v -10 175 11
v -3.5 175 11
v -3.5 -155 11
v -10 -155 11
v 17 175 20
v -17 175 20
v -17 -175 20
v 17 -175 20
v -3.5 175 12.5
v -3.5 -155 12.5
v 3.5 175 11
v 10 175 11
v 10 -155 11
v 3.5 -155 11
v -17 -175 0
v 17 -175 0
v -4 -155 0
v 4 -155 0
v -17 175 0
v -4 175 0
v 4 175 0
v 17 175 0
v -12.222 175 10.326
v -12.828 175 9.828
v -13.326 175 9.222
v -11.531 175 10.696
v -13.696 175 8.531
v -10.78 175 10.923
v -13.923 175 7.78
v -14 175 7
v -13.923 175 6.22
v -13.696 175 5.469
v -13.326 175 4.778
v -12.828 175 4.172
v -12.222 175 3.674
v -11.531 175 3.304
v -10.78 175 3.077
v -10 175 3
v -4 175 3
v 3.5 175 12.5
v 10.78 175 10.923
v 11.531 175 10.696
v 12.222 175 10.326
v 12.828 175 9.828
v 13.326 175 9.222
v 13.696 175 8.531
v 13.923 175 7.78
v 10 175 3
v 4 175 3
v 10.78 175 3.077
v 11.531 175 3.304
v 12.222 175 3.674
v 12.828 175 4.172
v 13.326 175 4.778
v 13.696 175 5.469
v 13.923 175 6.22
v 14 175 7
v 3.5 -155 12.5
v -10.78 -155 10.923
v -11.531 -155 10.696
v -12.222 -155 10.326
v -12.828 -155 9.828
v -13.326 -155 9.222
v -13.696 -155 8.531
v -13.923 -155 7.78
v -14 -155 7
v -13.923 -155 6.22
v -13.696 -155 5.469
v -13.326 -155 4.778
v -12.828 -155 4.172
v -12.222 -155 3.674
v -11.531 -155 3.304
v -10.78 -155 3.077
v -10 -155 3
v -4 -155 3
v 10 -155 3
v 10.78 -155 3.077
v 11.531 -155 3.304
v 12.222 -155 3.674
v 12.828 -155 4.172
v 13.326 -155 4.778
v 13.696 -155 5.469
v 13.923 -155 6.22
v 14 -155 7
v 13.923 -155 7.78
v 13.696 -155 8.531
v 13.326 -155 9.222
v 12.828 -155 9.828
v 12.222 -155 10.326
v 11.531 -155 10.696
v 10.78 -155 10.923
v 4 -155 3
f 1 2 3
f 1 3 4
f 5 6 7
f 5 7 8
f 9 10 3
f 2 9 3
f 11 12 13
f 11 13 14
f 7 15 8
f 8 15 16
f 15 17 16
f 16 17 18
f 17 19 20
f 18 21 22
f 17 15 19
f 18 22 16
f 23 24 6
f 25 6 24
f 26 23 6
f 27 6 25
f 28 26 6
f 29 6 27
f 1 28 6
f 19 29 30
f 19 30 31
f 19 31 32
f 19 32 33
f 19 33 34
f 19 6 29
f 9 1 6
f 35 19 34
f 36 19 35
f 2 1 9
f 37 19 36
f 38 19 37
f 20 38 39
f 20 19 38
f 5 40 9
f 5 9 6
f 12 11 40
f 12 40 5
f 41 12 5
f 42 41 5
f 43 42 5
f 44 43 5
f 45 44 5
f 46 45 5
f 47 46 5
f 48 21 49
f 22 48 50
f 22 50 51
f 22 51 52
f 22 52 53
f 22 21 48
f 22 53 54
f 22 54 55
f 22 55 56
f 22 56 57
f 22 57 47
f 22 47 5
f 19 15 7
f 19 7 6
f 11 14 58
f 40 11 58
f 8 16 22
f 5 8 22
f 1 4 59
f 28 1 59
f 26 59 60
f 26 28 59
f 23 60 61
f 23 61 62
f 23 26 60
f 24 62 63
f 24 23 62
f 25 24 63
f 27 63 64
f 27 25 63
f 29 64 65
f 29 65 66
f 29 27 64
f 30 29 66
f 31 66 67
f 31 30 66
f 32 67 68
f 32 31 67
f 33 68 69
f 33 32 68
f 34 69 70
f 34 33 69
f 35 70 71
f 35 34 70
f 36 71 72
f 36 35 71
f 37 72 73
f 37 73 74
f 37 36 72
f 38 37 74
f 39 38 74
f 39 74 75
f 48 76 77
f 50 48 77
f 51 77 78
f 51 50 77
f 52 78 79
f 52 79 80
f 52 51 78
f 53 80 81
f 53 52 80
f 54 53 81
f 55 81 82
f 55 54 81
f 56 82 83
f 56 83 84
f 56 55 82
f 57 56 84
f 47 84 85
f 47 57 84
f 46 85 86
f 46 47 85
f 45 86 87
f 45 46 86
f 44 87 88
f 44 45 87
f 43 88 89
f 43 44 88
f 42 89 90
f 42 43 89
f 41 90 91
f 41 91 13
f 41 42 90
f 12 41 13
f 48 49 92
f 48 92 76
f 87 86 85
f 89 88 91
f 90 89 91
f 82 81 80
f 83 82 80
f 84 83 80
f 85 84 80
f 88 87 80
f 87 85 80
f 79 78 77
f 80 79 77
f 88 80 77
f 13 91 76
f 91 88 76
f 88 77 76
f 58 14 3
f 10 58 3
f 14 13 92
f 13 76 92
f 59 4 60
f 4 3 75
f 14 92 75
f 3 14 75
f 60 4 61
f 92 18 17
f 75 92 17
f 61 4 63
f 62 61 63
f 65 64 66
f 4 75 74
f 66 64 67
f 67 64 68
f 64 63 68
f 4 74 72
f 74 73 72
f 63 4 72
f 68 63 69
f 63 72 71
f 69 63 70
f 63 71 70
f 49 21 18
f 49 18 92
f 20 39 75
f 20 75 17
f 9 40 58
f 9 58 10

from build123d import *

# Parameters (mm, degrees)
SKETCH1_W           = 34
SKETCH1_H           = 350
BOSS_EXTRUDE1_DEPTH = 20
CUT_EXTRUDE1_DEPTH  = 330


with BuildPart() as part:
    # Sketch1 → Boss-Extrude1 (new body)
    with BuildSketch(Plane.XY):
        Rectangle(SKETCH1_W, SKETCH1_H)
    extrude(amount=BOSS_EXTRUDE1_DEPTH)

    # Sketch2 → Cut-Extrude1 (cut)
    with BuildSketch(Plane(origin=(0, 175, 0), x_dir=(1, 0, 0), z_dir=(0, 1, 0))):
        with BuildLine():
            Line((-10, -3), (-4, -3))
            Line((-4, -3), (-4, 0))
            Line((-4, 0), (4, 0))
            Line((4, 0), (4, -3))
            Line((4, -3), (10, -3))
            ThreePointArc((10, -3), (14, -7), (10, -11))
            Line((10, -11), (3.5, -11))
            Line((3.5, -11), (3.5, -12.5))
            Line((3.5, -12.5), (-3.5, -12.5))
            Line((-3.5, -12.5), (-3.5, -11))
            Line((-3.5, -11), (-10, -11))
            ThreePointArc((-10, -11), (-14, -7), (-10, -3))
        make_face()
    extrude(amount=-CUT_EXTRUDE1_DEPTH, mode=Mode.SUBTRACT)


solid = part.part
